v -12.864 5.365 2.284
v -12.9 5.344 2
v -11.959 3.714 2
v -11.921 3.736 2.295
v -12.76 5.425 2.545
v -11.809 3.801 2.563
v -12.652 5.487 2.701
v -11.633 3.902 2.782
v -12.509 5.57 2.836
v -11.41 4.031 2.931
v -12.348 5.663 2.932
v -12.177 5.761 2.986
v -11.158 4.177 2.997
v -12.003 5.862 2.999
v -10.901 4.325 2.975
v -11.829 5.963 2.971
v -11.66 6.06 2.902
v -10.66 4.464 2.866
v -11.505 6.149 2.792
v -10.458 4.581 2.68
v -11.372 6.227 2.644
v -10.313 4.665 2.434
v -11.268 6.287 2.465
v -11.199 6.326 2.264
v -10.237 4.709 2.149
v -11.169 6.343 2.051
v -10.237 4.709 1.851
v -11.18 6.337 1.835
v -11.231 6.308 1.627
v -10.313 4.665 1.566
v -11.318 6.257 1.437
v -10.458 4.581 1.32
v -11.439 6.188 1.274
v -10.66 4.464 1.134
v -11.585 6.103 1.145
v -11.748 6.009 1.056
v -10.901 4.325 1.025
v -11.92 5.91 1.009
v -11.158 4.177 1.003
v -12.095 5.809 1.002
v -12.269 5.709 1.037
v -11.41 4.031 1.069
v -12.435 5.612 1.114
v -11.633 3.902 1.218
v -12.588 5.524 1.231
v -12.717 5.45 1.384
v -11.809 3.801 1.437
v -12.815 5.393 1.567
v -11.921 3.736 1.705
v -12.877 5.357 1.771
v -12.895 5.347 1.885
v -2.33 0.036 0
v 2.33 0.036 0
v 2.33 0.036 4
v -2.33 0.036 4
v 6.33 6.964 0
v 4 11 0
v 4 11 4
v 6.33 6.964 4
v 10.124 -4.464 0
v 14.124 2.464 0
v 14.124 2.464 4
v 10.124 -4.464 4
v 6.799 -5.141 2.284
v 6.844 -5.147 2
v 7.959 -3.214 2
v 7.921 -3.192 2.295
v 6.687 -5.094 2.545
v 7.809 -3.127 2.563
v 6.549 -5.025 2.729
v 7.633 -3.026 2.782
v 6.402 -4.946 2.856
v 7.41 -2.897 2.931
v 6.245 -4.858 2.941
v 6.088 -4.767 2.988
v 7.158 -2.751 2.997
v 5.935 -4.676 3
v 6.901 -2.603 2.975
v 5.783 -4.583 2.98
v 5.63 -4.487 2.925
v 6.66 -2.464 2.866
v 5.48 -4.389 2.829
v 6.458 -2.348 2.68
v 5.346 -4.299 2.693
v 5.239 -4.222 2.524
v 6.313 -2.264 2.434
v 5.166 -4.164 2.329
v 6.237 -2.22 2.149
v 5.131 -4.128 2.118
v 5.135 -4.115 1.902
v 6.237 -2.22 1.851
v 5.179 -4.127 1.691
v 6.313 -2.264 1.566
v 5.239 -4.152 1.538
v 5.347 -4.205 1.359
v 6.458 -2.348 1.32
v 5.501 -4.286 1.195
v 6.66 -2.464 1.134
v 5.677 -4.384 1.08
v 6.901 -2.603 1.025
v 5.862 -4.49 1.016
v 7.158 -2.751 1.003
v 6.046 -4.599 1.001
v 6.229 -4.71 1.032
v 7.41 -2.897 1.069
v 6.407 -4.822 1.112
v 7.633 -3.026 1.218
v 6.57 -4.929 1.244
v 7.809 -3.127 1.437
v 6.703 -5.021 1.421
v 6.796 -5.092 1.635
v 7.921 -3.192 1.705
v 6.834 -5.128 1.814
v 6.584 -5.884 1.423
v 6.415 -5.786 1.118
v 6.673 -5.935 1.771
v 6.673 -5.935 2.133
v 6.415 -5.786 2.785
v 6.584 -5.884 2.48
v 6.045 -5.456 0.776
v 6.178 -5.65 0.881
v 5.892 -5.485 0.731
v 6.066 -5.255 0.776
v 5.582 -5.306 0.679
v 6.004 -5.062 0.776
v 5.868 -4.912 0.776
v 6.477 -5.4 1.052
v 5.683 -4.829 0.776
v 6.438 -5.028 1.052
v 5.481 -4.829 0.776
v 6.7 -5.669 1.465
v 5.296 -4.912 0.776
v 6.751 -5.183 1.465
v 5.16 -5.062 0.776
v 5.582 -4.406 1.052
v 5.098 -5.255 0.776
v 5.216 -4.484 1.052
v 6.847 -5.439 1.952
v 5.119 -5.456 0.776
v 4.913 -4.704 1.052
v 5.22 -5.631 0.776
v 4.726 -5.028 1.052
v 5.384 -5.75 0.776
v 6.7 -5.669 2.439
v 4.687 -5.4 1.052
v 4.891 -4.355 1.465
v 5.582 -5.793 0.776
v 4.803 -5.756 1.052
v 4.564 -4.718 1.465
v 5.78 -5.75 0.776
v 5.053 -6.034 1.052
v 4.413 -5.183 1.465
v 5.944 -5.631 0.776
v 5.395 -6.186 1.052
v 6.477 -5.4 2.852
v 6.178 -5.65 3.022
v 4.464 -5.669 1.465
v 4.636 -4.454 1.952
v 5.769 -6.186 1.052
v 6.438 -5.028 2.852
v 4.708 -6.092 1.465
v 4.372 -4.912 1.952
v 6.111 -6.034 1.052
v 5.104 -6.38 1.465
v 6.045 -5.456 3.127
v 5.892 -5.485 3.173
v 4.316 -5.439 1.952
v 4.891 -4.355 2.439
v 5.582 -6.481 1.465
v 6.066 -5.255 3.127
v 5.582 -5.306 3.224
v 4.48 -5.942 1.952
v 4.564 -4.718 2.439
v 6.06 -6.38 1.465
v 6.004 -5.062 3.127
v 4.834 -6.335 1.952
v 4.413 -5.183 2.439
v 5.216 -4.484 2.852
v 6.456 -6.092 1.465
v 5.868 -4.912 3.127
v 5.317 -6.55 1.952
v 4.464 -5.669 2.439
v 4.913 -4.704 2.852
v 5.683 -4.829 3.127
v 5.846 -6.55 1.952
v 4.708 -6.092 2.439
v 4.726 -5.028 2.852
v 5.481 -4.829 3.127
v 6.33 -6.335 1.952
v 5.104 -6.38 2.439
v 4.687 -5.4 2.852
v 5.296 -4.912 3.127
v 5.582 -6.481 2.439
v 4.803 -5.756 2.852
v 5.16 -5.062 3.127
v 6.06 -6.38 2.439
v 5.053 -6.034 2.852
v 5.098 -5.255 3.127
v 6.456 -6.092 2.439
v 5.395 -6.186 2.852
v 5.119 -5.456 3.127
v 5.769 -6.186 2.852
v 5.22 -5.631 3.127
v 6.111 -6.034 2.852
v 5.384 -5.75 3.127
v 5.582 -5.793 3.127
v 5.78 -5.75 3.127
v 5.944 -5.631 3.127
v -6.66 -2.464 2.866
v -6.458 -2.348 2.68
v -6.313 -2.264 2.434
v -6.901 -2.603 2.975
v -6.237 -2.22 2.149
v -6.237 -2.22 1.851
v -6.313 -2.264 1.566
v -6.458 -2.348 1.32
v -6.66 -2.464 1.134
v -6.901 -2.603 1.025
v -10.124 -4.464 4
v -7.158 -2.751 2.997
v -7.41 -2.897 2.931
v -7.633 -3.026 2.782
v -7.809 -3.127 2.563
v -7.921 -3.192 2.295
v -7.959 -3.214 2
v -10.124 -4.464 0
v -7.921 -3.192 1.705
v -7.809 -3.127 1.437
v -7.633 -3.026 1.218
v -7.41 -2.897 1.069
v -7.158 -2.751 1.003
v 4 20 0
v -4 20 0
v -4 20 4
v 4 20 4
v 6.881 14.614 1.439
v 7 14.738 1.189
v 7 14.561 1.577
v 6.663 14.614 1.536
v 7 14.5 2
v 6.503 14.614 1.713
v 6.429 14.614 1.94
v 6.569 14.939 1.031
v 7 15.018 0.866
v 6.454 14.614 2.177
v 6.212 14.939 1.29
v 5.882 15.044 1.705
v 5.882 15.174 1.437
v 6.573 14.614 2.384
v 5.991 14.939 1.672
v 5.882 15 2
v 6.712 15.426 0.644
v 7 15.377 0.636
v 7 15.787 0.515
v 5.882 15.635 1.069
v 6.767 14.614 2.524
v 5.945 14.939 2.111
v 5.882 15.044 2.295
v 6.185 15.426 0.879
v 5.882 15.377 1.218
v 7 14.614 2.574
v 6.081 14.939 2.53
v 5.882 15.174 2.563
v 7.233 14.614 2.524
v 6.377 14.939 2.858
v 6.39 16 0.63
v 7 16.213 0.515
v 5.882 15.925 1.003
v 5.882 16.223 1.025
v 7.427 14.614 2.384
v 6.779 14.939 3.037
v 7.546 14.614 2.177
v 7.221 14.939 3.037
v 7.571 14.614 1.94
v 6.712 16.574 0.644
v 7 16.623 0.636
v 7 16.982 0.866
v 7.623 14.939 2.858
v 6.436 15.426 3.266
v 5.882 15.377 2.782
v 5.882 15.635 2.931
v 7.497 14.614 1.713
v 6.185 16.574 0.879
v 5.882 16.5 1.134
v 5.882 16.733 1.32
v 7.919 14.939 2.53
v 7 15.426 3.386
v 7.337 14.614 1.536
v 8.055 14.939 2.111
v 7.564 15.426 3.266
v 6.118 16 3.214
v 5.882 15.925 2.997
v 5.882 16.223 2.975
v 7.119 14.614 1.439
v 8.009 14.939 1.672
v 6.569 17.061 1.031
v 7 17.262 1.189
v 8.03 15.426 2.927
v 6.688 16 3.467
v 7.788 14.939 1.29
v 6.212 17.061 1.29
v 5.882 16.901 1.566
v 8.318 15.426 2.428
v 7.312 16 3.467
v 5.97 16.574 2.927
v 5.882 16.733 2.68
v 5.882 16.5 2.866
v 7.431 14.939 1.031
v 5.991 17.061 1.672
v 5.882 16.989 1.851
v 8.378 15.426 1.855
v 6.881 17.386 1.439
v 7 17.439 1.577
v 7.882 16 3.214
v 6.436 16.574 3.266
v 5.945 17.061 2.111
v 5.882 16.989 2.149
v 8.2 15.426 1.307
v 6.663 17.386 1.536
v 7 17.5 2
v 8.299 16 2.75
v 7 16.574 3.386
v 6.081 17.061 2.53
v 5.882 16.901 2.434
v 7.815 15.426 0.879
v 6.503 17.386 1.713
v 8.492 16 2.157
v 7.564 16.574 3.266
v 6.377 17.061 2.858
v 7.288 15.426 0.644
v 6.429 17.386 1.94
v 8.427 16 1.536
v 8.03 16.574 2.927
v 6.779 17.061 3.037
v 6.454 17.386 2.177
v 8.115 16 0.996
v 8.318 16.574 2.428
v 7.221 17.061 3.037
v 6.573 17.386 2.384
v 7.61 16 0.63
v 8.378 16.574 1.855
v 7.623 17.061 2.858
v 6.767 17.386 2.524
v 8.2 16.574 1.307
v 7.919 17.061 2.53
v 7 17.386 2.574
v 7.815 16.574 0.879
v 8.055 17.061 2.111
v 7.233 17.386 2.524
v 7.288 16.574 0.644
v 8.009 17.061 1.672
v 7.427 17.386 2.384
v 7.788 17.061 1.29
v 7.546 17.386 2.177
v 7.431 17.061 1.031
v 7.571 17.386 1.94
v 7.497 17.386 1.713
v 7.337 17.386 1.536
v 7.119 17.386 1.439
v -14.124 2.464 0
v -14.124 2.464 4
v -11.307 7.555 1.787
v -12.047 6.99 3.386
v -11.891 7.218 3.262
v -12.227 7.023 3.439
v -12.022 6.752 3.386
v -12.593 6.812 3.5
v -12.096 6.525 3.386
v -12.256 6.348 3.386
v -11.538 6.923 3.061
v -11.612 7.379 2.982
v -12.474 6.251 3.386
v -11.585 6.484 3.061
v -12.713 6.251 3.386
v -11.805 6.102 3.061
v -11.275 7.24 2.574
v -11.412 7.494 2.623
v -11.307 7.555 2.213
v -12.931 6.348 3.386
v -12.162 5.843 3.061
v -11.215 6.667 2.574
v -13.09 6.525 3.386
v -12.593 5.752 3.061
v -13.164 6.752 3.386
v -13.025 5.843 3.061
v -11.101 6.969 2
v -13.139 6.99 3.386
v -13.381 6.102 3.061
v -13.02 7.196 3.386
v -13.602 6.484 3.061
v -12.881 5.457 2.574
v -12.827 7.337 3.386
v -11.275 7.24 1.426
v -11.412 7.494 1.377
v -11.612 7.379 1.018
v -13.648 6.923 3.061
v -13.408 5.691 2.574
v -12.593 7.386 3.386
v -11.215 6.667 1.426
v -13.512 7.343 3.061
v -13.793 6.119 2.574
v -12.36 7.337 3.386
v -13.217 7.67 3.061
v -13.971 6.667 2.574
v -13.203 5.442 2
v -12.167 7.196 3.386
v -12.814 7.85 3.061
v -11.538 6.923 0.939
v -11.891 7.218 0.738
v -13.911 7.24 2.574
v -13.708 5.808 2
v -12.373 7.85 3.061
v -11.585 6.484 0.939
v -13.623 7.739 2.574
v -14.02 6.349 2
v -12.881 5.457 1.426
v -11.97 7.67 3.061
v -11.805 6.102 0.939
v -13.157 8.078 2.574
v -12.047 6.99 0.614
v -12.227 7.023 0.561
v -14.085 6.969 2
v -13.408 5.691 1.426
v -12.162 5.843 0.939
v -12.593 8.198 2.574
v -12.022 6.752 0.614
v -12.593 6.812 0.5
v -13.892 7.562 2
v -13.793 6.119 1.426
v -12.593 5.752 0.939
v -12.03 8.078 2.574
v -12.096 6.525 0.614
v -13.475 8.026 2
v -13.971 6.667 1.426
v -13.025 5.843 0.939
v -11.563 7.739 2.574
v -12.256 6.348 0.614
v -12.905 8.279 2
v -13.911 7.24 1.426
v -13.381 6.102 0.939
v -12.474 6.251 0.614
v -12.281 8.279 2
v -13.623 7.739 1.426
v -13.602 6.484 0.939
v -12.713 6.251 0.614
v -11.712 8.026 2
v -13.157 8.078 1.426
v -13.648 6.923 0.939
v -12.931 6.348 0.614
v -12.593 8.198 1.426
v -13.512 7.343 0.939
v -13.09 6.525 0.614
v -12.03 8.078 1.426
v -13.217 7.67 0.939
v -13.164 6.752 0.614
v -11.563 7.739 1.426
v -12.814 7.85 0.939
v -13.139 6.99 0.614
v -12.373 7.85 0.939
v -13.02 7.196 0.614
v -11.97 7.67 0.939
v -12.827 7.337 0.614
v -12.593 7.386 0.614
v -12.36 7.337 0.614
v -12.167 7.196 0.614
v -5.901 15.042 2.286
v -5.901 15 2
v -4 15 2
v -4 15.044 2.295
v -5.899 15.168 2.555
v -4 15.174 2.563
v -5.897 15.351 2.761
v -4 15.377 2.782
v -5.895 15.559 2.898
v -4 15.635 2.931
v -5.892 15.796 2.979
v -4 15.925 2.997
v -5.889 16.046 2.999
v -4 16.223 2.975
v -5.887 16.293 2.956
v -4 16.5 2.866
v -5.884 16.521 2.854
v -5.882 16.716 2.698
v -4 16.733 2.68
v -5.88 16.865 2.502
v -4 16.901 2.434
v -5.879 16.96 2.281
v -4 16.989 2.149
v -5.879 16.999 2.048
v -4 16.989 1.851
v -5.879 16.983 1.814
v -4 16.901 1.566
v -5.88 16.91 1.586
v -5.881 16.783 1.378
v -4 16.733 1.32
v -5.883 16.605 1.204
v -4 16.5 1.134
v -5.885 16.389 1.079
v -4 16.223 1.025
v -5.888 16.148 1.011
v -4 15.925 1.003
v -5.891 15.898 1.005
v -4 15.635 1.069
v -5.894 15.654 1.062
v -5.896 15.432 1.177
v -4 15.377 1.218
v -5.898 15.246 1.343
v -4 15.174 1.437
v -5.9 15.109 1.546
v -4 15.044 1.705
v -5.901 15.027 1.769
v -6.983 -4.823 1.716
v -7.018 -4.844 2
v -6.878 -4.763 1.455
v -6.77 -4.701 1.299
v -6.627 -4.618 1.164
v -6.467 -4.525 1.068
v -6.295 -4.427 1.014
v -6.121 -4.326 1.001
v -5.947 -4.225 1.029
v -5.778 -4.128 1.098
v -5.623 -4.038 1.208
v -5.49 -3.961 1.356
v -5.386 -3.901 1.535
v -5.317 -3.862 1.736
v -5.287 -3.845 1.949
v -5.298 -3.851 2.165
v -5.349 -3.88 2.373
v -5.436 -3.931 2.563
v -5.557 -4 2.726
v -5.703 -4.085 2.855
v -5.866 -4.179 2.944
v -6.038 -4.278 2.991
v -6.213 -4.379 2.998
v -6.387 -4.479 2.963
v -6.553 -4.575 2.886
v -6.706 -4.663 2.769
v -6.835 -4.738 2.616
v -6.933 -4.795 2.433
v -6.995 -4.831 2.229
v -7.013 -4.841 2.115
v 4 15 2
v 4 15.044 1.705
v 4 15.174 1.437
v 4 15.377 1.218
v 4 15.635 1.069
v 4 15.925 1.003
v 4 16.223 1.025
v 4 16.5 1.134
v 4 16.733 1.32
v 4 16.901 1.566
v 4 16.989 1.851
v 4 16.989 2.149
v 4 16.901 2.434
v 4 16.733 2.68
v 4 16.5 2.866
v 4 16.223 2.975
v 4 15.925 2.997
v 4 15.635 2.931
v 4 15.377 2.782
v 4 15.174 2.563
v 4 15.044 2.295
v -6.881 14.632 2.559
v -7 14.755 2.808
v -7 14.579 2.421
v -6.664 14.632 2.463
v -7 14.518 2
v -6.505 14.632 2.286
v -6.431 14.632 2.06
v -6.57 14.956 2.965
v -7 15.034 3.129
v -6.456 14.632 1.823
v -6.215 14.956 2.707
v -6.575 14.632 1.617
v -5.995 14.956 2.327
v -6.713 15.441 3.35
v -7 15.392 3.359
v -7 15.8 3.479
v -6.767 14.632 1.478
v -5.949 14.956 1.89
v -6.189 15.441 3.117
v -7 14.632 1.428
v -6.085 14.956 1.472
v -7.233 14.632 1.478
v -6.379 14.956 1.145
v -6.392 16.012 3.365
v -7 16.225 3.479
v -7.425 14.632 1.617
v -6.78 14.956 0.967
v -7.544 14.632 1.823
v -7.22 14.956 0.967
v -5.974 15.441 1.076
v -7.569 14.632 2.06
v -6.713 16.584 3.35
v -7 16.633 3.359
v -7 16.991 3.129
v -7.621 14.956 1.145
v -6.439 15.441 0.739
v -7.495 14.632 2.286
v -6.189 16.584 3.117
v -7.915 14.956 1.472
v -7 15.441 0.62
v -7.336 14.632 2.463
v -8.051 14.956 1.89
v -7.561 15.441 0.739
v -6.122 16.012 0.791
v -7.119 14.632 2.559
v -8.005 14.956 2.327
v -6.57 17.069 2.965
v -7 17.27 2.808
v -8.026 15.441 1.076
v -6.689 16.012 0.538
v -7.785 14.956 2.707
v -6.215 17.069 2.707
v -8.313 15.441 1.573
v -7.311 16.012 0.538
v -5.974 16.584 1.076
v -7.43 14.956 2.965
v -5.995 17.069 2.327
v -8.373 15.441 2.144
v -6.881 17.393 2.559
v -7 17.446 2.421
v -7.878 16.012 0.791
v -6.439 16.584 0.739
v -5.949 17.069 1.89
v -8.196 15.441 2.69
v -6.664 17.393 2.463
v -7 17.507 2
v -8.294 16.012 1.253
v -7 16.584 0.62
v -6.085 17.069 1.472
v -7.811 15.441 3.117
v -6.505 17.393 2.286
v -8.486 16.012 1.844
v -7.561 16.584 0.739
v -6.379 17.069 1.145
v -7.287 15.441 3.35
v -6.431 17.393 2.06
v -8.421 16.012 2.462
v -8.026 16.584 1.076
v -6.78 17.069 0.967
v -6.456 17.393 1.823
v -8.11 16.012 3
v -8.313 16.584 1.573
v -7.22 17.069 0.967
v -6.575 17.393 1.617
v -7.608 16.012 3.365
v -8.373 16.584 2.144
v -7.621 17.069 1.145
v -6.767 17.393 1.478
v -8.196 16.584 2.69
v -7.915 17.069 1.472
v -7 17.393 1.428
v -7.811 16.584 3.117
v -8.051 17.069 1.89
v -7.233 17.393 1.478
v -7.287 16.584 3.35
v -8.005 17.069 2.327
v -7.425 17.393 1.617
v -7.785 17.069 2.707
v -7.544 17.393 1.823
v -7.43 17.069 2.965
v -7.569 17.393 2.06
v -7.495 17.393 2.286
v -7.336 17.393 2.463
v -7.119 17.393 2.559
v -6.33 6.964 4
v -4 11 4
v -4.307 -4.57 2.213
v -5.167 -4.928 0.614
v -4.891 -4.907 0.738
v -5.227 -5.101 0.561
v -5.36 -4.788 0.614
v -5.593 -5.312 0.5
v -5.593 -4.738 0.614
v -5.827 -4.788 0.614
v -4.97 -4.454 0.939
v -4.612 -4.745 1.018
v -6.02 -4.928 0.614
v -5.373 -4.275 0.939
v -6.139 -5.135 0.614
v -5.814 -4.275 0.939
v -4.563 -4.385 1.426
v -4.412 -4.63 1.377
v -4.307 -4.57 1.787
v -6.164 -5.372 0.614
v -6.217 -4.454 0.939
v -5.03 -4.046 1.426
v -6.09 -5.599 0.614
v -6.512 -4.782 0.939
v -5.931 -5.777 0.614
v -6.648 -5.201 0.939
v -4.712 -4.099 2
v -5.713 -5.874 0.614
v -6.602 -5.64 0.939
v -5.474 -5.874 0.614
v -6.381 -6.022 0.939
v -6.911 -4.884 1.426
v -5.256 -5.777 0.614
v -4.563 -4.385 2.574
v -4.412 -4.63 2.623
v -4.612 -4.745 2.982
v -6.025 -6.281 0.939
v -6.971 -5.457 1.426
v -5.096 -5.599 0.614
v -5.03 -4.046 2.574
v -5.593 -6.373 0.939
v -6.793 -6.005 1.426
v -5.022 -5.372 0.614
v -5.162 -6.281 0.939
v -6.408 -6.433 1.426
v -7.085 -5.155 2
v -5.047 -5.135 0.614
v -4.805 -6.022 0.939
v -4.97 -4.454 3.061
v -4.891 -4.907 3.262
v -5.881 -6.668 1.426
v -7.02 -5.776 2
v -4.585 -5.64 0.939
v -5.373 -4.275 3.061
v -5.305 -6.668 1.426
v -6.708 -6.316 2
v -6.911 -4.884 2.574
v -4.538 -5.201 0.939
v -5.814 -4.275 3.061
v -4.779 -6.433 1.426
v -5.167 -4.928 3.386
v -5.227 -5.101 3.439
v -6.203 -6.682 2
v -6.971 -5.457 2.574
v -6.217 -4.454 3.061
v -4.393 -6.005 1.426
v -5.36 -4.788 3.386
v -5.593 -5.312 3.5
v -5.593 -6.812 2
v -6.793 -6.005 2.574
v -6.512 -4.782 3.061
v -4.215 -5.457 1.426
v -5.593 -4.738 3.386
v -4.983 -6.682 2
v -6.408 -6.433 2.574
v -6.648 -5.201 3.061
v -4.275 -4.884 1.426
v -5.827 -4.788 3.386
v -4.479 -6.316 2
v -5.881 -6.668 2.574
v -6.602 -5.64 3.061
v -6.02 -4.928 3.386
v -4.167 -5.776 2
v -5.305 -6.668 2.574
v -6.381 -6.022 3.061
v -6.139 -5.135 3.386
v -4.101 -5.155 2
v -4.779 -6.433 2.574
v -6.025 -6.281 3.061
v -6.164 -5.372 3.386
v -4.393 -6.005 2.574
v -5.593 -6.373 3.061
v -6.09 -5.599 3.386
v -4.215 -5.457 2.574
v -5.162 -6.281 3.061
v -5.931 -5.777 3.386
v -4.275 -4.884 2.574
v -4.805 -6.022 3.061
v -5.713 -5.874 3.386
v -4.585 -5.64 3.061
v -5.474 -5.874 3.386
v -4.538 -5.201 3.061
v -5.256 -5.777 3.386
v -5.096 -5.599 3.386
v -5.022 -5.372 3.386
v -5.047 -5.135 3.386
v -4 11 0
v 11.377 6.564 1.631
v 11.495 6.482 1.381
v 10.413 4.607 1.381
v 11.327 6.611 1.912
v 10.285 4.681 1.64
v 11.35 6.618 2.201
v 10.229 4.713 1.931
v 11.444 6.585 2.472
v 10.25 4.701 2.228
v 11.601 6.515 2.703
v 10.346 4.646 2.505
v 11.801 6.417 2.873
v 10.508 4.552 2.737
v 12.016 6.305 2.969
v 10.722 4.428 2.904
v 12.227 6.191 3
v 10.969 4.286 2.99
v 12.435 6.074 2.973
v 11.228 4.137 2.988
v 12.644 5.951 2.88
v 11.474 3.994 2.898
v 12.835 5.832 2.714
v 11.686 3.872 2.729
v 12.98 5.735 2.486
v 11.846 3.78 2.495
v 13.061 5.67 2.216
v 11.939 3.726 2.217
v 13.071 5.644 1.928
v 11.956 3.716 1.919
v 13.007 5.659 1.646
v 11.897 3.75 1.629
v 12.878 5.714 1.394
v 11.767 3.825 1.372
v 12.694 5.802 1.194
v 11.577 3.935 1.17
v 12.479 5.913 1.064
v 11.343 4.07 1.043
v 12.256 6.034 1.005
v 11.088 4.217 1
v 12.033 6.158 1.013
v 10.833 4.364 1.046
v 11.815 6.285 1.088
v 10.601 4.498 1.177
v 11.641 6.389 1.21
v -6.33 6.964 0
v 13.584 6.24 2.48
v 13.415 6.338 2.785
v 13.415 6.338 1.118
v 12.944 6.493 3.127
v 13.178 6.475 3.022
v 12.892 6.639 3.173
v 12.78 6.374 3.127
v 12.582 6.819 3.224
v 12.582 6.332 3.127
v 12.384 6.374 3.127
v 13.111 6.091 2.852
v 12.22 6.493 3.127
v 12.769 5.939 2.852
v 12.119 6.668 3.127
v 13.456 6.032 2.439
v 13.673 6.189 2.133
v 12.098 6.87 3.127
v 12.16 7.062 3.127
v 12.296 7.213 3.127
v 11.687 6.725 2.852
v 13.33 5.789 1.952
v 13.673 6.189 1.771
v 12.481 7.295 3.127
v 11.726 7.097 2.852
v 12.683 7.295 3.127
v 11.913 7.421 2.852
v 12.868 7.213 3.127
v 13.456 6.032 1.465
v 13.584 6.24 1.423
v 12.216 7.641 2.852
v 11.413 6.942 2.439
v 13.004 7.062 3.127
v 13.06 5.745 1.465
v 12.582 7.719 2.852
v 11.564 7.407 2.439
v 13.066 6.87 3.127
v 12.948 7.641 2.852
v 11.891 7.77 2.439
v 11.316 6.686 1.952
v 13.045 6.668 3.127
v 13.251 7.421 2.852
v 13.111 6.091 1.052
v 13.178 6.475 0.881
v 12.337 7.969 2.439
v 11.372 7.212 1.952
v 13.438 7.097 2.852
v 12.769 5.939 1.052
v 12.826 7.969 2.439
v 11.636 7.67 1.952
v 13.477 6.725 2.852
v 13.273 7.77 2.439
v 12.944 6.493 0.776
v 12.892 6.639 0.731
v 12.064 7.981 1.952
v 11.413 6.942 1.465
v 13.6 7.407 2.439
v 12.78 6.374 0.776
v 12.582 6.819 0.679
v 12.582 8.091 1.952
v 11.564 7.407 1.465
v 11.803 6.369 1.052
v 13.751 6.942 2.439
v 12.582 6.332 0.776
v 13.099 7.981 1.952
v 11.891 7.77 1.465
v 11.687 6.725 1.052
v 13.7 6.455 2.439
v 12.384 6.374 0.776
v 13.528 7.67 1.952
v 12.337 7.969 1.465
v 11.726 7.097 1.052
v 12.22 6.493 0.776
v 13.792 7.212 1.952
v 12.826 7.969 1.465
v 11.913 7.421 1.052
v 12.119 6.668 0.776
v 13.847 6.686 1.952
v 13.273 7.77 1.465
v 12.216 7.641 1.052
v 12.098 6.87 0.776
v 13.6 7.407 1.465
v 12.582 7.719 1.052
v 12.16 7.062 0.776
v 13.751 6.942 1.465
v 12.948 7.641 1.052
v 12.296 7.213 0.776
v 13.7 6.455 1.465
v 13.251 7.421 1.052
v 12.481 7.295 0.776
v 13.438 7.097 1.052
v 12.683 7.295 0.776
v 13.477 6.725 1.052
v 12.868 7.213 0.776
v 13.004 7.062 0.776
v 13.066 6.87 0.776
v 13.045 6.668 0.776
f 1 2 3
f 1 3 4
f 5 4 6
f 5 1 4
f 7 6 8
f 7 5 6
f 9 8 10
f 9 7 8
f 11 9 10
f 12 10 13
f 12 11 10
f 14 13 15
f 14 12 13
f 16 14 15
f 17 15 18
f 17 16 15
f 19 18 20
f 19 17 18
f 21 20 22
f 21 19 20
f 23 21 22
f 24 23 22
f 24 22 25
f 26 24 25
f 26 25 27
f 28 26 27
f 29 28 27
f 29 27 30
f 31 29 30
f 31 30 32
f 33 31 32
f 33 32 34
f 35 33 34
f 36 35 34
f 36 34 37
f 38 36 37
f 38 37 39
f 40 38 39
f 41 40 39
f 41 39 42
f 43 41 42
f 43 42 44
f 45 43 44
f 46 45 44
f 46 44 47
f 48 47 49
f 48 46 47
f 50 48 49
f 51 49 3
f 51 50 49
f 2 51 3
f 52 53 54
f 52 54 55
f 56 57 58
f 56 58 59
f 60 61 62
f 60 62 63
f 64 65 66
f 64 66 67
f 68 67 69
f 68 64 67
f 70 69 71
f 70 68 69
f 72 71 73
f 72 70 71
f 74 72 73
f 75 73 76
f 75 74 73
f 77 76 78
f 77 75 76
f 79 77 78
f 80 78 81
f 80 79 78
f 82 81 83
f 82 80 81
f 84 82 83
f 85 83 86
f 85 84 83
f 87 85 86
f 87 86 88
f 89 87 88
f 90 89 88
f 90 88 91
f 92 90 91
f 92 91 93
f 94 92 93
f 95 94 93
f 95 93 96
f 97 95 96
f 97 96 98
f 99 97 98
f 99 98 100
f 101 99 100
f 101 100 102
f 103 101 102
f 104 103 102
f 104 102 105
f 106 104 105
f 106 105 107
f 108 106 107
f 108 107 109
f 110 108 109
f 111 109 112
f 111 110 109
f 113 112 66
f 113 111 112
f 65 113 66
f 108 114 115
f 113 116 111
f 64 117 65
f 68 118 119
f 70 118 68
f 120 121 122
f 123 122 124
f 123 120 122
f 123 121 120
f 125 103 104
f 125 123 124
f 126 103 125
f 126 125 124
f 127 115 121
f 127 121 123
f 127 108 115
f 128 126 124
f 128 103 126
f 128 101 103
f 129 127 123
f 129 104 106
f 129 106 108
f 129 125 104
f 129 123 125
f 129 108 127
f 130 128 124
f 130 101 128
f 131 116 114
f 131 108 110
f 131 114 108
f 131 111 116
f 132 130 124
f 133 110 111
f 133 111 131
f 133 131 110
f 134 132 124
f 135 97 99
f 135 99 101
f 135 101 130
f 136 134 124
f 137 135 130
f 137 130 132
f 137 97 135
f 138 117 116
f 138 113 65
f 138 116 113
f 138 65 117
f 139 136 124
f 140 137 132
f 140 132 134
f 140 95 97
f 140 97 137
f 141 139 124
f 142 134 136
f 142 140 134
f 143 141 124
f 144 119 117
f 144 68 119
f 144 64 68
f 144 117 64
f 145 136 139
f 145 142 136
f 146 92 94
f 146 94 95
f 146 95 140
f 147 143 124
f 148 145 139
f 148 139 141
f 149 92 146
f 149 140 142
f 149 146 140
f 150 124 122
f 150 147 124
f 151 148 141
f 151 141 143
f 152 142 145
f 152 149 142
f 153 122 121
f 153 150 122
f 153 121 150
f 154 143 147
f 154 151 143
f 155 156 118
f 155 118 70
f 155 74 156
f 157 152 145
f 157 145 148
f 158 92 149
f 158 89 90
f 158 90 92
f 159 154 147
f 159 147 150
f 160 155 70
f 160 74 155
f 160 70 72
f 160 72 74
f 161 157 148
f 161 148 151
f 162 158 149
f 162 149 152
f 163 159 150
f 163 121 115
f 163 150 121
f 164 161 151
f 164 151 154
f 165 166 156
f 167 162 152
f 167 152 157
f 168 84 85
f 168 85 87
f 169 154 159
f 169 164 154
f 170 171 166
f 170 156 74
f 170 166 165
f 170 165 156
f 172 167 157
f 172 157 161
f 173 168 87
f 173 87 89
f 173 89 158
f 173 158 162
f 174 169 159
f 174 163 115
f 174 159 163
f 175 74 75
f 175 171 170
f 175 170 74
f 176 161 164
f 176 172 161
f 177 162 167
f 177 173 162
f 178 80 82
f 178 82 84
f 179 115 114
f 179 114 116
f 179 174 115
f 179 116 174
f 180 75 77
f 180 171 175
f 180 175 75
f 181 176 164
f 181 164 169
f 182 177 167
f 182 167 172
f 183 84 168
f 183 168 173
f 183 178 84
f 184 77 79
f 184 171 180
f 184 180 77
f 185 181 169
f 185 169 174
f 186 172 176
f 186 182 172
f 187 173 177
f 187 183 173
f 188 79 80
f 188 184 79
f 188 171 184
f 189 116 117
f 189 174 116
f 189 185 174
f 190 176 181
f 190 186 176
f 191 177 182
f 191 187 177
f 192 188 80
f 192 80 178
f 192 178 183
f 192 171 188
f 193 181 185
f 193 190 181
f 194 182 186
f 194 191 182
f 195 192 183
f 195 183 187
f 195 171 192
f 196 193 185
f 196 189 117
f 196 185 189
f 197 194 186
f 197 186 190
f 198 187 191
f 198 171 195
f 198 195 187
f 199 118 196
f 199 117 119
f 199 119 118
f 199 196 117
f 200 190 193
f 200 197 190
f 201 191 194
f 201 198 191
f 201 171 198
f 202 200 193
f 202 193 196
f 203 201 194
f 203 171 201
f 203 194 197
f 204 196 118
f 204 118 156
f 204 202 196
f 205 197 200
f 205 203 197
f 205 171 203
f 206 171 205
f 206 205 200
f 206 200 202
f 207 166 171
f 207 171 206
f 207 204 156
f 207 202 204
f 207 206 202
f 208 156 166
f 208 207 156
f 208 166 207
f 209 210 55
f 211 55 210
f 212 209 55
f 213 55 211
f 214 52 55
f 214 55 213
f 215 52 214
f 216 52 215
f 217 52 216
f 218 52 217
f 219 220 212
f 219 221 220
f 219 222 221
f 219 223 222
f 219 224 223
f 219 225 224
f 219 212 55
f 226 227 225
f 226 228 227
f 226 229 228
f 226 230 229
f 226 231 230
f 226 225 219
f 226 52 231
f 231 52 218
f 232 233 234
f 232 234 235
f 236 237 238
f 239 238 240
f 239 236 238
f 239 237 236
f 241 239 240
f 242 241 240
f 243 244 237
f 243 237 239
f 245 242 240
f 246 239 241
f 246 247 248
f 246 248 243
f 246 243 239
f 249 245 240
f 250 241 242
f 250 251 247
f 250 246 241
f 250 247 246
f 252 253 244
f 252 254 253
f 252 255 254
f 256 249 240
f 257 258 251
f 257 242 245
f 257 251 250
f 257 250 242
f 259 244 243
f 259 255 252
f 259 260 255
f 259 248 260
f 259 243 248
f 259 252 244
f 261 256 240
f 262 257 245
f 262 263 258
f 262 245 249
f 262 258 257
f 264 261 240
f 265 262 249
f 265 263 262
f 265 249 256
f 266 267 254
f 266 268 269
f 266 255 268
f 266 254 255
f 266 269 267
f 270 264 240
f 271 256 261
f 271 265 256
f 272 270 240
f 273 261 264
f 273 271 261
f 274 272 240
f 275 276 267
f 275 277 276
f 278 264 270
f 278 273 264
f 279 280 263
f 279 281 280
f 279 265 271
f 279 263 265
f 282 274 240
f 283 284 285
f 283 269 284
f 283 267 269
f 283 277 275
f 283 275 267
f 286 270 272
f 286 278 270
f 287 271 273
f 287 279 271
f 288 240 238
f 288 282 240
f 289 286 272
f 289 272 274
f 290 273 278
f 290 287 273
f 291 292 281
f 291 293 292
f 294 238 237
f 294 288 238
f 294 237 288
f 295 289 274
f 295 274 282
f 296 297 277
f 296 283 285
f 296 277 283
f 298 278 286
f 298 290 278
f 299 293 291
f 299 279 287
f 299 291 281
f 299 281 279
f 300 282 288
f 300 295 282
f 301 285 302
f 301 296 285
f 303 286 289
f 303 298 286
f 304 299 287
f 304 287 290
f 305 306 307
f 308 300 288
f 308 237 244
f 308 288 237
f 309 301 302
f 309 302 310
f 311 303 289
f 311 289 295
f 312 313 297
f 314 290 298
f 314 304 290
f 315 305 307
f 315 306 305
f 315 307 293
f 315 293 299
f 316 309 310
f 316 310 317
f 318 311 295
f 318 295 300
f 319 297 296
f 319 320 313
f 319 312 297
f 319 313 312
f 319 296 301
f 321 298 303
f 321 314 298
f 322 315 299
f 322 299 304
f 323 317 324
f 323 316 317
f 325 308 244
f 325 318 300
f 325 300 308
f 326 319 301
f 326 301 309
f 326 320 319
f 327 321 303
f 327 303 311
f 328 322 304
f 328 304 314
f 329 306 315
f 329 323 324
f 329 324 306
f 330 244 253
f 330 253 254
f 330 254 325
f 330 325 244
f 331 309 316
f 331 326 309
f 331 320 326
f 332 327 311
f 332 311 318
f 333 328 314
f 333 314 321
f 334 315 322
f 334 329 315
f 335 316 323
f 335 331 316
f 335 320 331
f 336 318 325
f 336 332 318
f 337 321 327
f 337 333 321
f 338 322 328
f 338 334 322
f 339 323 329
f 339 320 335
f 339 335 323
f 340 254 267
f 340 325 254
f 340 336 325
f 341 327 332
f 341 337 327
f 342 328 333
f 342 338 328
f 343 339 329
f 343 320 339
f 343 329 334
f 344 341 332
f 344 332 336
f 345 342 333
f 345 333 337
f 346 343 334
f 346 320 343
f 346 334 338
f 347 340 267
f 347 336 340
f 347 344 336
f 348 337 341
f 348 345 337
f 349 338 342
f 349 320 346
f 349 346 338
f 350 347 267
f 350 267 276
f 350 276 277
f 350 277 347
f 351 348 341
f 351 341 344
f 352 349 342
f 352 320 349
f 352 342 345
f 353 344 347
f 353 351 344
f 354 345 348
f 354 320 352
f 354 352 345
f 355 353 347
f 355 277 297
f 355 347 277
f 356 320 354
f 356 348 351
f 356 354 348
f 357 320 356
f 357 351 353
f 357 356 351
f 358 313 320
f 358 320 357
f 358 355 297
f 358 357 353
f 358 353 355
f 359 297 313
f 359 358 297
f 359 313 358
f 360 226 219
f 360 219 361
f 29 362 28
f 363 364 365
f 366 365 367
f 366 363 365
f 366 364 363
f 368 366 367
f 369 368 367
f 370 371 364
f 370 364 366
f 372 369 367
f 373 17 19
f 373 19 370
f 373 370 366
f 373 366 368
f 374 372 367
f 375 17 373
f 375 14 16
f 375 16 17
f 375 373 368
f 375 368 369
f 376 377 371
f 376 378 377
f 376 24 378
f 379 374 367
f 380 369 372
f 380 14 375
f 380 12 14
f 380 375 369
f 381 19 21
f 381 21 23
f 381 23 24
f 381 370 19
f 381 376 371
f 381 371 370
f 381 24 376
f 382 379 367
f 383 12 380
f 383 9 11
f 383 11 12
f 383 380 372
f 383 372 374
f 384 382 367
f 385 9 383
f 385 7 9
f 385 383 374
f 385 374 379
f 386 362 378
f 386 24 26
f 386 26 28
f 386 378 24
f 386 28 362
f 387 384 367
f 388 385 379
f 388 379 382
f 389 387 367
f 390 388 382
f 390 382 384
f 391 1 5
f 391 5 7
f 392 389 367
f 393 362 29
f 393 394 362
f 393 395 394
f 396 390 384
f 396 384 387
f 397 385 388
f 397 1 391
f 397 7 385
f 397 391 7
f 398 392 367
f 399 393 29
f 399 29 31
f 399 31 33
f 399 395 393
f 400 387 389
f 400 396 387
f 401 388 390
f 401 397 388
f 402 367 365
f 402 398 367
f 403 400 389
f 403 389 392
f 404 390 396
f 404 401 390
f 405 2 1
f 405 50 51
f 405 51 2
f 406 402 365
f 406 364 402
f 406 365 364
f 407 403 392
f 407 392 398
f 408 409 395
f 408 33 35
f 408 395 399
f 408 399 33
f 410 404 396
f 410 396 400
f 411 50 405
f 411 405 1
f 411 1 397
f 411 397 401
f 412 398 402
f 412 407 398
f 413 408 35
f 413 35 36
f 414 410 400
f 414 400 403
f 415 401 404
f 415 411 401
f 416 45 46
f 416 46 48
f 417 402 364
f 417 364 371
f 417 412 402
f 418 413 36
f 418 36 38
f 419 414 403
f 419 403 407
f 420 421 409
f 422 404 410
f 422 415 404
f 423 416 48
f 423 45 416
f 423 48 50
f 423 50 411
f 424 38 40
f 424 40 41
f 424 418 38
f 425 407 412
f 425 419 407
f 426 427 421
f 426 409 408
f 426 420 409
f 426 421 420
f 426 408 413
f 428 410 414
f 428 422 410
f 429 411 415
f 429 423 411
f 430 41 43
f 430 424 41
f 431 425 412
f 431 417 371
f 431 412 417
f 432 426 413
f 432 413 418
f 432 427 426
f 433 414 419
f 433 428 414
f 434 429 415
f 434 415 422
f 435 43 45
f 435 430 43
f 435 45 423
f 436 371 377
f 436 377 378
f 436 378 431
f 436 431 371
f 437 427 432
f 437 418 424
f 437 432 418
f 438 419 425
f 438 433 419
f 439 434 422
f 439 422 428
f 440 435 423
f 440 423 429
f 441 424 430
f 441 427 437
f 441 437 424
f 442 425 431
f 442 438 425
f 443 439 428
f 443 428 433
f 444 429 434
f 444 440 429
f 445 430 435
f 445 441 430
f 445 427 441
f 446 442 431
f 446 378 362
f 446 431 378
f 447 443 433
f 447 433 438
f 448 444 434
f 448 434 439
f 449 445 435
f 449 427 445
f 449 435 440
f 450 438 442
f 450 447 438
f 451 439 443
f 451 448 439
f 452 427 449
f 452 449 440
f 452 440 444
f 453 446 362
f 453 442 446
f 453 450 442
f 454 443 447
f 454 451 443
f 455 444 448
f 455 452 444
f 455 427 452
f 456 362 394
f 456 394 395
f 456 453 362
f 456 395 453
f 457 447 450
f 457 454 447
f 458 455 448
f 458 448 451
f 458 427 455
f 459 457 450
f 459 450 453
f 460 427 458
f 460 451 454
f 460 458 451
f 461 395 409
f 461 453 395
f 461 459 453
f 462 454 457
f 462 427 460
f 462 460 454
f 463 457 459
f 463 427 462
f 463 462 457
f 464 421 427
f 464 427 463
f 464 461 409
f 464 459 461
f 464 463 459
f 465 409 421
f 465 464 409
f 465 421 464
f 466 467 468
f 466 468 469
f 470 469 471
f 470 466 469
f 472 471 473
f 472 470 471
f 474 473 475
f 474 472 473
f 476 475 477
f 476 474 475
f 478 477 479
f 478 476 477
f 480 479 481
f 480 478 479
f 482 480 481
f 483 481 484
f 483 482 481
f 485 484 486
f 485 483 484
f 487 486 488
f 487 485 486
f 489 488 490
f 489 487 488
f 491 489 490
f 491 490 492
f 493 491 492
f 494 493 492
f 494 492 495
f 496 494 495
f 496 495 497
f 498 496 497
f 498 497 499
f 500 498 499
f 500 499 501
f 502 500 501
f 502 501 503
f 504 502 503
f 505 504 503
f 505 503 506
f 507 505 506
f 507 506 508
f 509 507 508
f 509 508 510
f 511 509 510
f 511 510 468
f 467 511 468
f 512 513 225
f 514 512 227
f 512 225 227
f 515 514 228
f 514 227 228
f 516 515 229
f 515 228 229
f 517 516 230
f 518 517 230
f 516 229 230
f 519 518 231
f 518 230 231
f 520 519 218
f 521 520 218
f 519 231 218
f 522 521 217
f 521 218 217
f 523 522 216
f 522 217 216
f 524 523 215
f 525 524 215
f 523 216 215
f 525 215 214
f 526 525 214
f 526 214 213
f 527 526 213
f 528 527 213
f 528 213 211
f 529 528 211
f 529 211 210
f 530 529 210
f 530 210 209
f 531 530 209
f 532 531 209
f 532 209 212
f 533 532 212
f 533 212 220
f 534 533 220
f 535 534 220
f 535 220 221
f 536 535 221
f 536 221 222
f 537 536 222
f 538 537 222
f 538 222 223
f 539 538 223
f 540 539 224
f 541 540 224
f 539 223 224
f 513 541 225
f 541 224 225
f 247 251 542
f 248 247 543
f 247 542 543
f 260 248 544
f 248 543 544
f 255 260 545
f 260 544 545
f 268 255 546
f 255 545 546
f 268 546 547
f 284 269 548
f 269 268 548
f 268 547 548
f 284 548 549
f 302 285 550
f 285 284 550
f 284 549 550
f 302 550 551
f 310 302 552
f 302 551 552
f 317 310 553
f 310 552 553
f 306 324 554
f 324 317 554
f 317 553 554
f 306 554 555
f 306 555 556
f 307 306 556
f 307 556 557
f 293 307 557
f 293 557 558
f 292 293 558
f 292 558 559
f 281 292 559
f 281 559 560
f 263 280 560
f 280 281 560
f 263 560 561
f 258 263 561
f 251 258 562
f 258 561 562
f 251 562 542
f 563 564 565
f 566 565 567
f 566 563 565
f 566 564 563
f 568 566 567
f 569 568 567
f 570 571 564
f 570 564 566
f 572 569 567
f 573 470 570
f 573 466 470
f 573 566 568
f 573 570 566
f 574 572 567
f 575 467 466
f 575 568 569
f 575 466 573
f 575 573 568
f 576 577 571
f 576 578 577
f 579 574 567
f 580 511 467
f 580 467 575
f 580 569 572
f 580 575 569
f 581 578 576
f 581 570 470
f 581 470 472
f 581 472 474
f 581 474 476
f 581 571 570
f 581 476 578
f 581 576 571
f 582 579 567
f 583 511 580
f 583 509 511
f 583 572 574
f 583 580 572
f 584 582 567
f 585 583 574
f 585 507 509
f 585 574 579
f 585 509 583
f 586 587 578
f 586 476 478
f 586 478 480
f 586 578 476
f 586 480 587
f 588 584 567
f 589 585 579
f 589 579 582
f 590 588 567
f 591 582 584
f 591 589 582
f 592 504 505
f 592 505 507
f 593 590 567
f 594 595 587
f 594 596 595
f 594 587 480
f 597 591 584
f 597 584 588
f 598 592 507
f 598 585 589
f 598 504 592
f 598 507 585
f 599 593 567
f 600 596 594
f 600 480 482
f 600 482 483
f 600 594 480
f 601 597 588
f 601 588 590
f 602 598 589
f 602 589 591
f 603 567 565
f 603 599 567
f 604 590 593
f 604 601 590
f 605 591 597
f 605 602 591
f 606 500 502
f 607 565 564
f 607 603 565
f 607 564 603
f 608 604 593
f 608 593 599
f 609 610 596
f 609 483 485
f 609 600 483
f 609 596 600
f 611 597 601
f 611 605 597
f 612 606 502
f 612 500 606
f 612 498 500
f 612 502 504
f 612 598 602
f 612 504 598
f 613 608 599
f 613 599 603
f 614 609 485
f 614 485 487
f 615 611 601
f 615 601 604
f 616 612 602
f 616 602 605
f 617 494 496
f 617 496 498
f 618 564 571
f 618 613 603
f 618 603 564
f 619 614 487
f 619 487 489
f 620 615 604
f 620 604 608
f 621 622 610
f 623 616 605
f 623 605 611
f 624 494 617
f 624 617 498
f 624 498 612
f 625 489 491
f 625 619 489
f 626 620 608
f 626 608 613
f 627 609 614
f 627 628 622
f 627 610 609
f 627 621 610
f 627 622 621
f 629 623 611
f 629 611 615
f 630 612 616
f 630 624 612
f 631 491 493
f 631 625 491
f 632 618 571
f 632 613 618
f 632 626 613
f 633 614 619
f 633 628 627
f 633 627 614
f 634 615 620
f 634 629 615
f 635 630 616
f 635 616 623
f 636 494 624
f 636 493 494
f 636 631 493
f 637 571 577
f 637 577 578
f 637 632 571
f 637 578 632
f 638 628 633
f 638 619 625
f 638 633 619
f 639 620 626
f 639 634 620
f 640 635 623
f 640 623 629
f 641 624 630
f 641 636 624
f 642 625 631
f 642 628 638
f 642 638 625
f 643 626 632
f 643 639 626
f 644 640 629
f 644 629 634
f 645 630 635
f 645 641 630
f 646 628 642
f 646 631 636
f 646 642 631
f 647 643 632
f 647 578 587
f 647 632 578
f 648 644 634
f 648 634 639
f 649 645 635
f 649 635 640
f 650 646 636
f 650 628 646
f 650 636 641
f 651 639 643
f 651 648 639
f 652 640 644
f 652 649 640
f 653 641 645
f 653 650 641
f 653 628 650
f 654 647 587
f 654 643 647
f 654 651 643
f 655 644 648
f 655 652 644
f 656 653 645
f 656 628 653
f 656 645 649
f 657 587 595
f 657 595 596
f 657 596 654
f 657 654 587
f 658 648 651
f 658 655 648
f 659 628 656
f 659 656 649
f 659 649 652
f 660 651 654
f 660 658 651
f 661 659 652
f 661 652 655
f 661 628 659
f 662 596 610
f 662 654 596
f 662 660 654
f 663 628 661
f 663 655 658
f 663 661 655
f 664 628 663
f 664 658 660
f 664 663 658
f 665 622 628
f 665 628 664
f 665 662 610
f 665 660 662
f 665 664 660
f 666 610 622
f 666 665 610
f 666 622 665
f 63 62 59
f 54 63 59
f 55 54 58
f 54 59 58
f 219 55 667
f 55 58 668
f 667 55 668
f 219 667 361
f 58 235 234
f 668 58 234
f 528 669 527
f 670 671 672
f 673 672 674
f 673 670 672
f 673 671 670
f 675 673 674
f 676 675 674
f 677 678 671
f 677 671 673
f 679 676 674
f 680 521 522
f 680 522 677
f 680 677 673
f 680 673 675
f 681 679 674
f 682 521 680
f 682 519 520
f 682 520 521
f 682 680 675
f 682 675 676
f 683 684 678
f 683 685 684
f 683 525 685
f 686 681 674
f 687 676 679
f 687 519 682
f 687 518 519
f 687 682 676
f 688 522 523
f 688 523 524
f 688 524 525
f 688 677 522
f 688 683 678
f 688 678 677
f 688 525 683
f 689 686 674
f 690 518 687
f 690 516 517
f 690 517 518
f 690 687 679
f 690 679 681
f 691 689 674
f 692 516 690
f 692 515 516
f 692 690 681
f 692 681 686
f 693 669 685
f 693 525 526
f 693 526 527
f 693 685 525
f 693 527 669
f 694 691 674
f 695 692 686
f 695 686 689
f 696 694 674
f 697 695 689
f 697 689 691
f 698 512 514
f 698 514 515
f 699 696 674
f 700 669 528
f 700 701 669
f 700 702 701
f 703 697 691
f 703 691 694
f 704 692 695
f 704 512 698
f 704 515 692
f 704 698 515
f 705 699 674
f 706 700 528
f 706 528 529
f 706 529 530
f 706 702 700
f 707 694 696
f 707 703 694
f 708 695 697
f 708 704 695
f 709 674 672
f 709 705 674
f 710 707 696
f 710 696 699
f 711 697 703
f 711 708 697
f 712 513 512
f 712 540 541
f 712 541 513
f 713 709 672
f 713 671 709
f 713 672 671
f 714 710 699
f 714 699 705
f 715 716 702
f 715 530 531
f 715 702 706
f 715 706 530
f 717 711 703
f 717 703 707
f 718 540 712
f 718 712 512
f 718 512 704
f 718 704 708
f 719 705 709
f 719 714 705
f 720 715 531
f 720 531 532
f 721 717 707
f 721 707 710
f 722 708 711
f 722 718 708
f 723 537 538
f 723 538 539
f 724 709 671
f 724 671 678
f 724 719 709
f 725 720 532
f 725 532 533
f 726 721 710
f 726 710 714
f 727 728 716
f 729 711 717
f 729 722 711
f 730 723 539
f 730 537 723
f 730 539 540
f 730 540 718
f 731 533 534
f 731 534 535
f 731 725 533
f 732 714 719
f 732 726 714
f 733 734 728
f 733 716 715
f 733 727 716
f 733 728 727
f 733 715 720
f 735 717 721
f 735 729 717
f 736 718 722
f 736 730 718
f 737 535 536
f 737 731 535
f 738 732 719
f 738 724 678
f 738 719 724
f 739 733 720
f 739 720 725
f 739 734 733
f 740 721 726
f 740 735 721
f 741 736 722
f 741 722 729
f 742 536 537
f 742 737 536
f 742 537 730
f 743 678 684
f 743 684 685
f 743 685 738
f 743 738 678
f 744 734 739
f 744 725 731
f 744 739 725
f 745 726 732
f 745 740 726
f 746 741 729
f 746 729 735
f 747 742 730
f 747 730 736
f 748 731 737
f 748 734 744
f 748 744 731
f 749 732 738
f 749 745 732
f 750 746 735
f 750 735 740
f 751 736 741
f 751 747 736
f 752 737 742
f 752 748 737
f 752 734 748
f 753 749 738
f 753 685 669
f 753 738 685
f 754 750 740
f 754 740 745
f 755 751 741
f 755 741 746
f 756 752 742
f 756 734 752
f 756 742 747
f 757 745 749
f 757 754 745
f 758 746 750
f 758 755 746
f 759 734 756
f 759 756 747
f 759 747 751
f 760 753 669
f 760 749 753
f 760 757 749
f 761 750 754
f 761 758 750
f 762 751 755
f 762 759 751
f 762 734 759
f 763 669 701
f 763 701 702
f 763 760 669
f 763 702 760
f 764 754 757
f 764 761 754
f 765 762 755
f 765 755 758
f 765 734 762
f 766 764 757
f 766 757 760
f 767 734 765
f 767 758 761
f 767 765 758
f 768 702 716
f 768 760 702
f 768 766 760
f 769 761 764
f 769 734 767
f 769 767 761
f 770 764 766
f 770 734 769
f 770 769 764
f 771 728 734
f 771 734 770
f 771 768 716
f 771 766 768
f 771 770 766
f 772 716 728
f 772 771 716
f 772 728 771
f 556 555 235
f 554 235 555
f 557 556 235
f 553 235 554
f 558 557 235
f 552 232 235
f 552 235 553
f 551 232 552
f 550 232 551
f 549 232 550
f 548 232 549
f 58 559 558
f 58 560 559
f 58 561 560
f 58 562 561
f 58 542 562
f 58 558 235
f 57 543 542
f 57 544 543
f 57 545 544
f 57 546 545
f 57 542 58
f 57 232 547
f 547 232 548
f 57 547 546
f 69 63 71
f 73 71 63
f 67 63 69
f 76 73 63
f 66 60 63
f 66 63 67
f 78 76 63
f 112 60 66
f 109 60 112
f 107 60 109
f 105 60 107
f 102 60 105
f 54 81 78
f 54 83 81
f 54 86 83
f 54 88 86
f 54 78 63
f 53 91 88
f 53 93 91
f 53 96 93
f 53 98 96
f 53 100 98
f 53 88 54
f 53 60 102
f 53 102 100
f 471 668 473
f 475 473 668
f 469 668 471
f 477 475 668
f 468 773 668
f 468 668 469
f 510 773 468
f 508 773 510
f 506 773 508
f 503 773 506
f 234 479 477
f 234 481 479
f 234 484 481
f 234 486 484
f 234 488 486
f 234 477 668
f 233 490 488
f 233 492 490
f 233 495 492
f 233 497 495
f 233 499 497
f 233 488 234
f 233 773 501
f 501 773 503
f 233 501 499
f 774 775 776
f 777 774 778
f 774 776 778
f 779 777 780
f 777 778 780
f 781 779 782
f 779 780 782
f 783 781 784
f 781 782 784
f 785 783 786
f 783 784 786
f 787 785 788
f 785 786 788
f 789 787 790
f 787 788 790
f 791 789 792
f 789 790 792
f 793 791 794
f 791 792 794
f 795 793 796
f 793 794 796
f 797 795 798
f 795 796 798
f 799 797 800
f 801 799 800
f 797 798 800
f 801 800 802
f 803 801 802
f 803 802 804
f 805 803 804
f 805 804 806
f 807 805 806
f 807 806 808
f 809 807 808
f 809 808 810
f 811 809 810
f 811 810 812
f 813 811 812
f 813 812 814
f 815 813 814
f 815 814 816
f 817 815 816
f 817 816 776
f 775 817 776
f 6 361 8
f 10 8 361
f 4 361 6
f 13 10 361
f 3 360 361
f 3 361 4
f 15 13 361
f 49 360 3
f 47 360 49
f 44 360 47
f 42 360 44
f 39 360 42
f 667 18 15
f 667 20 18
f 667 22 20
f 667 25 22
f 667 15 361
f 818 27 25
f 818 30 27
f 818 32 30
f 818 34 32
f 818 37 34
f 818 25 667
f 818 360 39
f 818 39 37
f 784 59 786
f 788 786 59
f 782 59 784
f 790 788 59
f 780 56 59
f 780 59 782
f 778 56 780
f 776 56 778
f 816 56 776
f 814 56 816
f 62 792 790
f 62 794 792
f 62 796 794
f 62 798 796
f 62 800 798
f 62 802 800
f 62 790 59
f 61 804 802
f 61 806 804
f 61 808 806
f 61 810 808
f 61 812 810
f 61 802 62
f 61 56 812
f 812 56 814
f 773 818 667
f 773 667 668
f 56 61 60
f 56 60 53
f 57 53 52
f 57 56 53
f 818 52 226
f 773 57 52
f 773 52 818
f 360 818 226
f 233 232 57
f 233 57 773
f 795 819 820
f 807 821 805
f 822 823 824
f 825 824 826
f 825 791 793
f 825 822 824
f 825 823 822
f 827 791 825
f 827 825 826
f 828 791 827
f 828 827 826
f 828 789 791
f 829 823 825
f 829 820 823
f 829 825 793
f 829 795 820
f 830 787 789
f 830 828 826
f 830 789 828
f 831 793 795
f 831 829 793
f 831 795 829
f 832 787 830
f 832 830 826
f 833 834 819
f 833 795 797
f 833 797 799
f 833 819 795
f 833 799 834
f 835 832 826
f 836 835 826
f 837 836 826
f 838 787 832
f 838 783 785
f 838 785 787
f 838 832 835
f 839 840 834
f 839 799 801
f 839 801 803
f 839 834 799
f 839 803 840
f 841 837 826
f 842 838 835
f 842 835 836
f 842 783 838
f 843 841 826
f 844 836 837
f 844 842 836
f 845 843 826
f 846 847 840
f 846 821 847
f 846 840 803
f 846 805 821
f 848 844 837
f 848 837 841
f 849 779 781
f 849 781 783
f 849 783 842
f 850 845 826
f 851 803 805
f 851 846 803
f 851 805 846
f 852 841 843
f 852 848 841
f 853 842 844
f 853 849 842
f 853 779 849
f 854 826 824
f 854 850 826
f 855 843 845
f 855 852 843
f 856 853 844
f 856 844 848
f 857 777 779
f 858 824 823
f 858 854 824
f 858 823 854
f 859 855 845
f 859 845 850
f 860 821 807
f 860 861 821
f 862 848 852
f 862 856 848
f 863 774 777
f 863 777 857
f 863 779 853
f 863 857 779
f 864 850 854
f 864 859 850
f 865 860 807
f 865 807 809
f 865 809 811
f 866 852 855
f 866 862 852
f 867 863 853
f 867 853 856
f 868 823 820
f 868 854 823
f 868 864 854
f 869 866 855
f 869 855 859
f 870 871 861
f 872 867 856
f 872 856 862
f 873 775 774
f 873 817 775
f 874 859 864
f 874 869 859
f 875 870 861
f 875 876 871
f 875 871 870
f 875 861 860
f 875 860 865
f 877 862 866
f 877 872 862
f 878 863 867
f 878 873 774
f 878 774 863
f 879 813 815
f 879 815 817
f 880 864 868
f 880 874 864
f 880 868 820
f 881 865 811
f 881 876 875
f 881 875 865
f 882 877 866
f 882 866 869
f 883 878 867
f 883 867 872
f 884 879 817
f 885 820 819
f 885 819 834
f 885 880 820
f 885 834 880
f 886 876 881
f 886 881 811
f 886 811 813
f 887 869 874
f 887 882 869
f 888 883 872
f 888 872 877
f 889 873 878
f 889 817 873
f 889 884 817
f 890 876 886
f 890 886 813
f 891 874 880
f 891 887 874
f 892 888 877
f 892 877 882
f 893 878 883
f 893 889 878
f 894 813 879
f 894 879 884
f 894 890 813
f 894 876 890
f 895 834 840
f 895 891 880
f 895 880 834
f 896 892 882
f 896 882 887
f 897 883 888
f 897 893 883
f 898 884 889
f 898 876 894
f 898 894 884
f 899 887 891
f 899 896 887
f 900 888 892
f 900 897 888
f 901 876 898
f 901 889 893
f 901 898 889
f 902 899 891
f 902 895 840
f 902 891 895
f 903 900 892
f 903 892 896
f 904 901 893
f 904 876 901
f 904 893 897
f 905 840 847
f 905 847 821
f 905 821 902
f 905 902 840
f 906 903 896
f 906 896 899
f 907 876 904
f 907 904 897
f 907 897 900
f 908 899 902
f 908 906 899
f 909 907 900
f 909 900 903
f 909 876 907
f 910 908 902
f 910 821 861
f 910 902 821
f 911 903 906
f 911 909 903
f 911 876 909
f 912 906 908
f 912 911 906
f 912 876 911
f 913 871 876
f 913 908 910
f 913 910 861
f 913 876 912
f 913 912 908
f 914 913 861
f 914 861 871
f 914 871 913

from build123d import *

# Parameters (mm, degrees)
BOSS_EXTRUDE1_DEPTH = 4
SKETCH4_R           = 1
BOSS_EXTRUDE2_DEPTH = 3
CIRPATTERN1_COUNT   = 3
BOSS_EXTRUDE3_START = 3
SKETCH8_R           = 1
BOSS_EXTRUDE3_DEPTH = 3
BOSS_EXTRUDE4_START = 3
SKETCH11_R          = 1
BOSS_EXTRUDE4_DEPTH = 3
SKETCH16_R          = 1
BOSS_EXTRUDE6_DEPTH = 3
SKETCH23_R          = 1
BOSS_EXTRUDE8_DEPTH = 3
BOSS_EXTRUDE9_START = 3
SKETCH21_R          = 1
BOSS_EXTRUDE9_DEPTH = 3


with BuildPart() as part:
    # Sketch1 → Boss-Extrude1 (new body)
    with BuildSketch(Plane.XY):
        Polygon((-4, 20), (4, 20), (4, 11), (6.330127019, 6.964101615), (14.124355653, 2.464101615), (10.124355653, -4.464101615), (2.330127019, 0.035898385), (-2.330127019, 0.035898385), (-10.124355653, -4.464101615), (-14.124355653, 2.464101615), (-6.330127019, 6.964101615), (-4, 11), align=None)
    extrude(amount=BOSS_EXTRUDE1_DEPTH)

    # Sketch4 → Boss-Extrude2 (add)
    with BuildSketch(Plane(origin=(-0.598076211, 1.035898385, 0), x_dir=(0.8660254037844431, 0.49999999999999223, 0), z_dir=(0.49999999999999223, -0.8660254037844431, 0))):
        with Locations(Location((-7.5, 2, 0), (0, 0, 180))):
            Circle(SKETCH4_R)
    boss_extrude2 = extrude(amount=BOSS_EXTRUDE2_DEPTH)

    # CirPattern1: Boss-Extrude2 ×3 about axis
    cirpattern1_axis = Axis((0, 0, 0), (0, 0, 1))
    for i in range(1, CIRPATTERN1_COUNT):
        add(boss_extrude2.rotate(cirpattern1_axis, i * 360 / CIRPATTERN1_COUNT))

    # Sketch6 → Revolve1 (revolve)
    with BuildSketch(Plane(origin=(3.5, 6.062177826, 0), x_dir=(0.8660254037844365, -0.5000000000000039, 0), z_dir=(0.5000000000000038, 0.8660254037844364, 0))):
        with BuildLine():
            Line((7.486880827, -0.679237196), (7.486880827, -3.224244757))
            ThreePointArc((7.486880827, -3.224244757), (8.759384608, -1.951740977), (7.486880827, -0.679237196))
        make_face()
    revolve(axis=Axis((9.983828992, 2.318737413, 1001.951740977), (0, 0, -1)))

    # Sketch8 → Boss-Extrude3 (add)
    with BuildSketch(Plane(origin=(0.598076211, 1.035898385, 0), x_dir=(0.8660254037844365, -0.5000000000000039, 0), z_dir=(-0.5000000000000039, -0.8660254037844365, 0)).offset(BOSS_EXTRUDE3_START)):
        with Locations((7.5, 2)):
            Circle(SKETCH8_R)
    extrude(amount=-BOSS_EXTRUDE3_DEPTH)

    # Sketch9 → Revolve2 (revolve)
    with BuildSketch(Plane(origin=(-0.901923789, -1.562177826, 0), x_dir=(0.8660254037844364, -0.500000000000004, 0), z_dir=(-0.500000000000004, -0.8660254037844365, 0))):
        with BuildLine():
            Line((7.486880827, 3.224244757), (7.486880827, 0.679237196))
            ThreePointArc((7.486880827, 0.679237196), (8.759384608, 1.951740977), (7.486880827, 3.224244757))
        make_face()
    revolve(axis=Axis((5.581905203, -5.30561824, -998.048259023), (0, 0, 1)))

    # Sketch10 → Revolve3 (revolve)
    with BuildSketch(Plane(origin=(0.901923789, -1.562177826, 0), x_dir=(0.8660254037844431, 0.4999999999999923, 0), z_dir=(0.49999999999999223, -0.866025403784443, 0))):
        with BuildLine():
            Line((-7.5, 3.5), (-7.5, 0.5))
            ThreePointArc((-7.5, 0.5), (-6, 2), (-7.5, 3.5))
        make_face()
    revolve(axis=Axis((-5.59326674, -5.312177826, -998), (0, 0, 1)))

    # Sketch11 → Boss-Extrude4 (add)
    with BuildSketch(Plane(origin=(-4.598076211, 7.964101615, 0), x_dir=(0.8660254037844433, 0.49999999999999195, 0), z_dir=(-0.49999999999999195, 0.8660254037844433, 0)).offset(BOSS_EXTRUDE4_START)):
        with Locations(Location((-7.5, -2, 0), (0, 0, 180))):
            Circle(SKETCH11_R)
    extrude(amount=-BOSS_EXTRUDE4_DEPTH)

    # Sketch12 → Revolve4 (revolve)
    with BuildSketch(Plane(origin=(-6.098076211, 10.562177826, 0), x_dir=(0.8660254037844434, 0.49999999999999195, 0), z_dir=(-0.49999999999999195, 0.8660254037844434, 0))):
        with BuildLine():
            Line((-7.5, -0.5), (-7.5, -3.5))
            ThreePointArc((-7.5, -3.5), (-6, -2), (-7.5, -0.5))
        make_face()
    revolve(axis=Axis((-12.59326674, 6.812177826, 1002), (0, 0, -1)))

    # Sketch16 → Boss-Extrude6 (add)
    with BuildSketch(Plane(origin=(4.598076211, 7.964101615, 0), x_dir=(0.8660254037844386, -0.5000000000000001, 0), z_dir=(0.5000000000000001, 0.8660254037844386, 0))):
        with Locations(Location((7.5, -2, 0), (0, 0, 141.776738897))):
            Circle(SKETCH16_R)
    extrude(amount=BOSS_EXTRUDE6_DEPTH)

    # Sketch17 → Revolve7 (revolve)
    with BuildSketch(Plane(origin=(6.098076211, 10.562177826, 0), x_dir=(0.8660254037844386, -0.5000000000000001, 0), z_dir=(0.5000000000000001, 0.8660254037844386, 0))):
        with BuildLine():
            Line((7.486880827, -0.679237196), (7.486880827, -3.224244757))
            ThreePointArc((7.486880827, -3.224244757), (8.759384608, -1.951740977), (7.486880827, -0.679237196))
        make_face()
    revolve(axis=Axis((12.581905203, 6.818737413, 1001.951740977), (0, 0, -1)))

    # Sketch23 → Boss-Extrude8 (add)
    with BuildSketch(Plane(origin=(4, 0, 0), x_dir=(0, 0, -1), z_dir=(1, 0, 0))):
        with Locations(Location((-2, 16, 0), (0, 0, 270))):
            Circle(SKETCH23_R)
    extrude(amount=BOSS_EXTRUDE8_DEPTH)

    # Sketch25 → Revolve9 (revolve)
    with BuildSketch(Plane(origin=(7, 0, 0), x_dir=(0, 0, -1), z_dir=(1, 0, 0))):
        with BuildLine():
            Line((-2, 17.5), (-2, 14.5))
            ThreePointArc((-2, 14.5), (-0.5, 16), (-2, 17.5))
        make_face()
    revolve(axis=Axis((7, -984, 2), (0, 1, 0)))

    # Sketch21 → Boss-Extrude9 (add)
    with BuildSketch(Plane.ZY.offset(4).offset(BOSS_EXTRUDE9_START)):
        with Locations(Location((2, 16, 0), (0, 0, 270))):
            Circle(SKETCH21_R)
    extrude(amount=-BOSS_EXTRUDE9_DEPTH)

    # Sketch26 → Revolve10 (revolve)
    with BuildSketch(Plane.ZY.offset(7)):
        with BuildLine():
            Line((2, 17.506711092), (2, 14.518258878))
            ThreePointArc((2, 14.518258878), (3.494226107, 16.012484985), (2, 17.506711092))
        make_face()
    revolve(axis=Axis((-7, -984, 2), (0, 1, 0)))


solid = part.part
